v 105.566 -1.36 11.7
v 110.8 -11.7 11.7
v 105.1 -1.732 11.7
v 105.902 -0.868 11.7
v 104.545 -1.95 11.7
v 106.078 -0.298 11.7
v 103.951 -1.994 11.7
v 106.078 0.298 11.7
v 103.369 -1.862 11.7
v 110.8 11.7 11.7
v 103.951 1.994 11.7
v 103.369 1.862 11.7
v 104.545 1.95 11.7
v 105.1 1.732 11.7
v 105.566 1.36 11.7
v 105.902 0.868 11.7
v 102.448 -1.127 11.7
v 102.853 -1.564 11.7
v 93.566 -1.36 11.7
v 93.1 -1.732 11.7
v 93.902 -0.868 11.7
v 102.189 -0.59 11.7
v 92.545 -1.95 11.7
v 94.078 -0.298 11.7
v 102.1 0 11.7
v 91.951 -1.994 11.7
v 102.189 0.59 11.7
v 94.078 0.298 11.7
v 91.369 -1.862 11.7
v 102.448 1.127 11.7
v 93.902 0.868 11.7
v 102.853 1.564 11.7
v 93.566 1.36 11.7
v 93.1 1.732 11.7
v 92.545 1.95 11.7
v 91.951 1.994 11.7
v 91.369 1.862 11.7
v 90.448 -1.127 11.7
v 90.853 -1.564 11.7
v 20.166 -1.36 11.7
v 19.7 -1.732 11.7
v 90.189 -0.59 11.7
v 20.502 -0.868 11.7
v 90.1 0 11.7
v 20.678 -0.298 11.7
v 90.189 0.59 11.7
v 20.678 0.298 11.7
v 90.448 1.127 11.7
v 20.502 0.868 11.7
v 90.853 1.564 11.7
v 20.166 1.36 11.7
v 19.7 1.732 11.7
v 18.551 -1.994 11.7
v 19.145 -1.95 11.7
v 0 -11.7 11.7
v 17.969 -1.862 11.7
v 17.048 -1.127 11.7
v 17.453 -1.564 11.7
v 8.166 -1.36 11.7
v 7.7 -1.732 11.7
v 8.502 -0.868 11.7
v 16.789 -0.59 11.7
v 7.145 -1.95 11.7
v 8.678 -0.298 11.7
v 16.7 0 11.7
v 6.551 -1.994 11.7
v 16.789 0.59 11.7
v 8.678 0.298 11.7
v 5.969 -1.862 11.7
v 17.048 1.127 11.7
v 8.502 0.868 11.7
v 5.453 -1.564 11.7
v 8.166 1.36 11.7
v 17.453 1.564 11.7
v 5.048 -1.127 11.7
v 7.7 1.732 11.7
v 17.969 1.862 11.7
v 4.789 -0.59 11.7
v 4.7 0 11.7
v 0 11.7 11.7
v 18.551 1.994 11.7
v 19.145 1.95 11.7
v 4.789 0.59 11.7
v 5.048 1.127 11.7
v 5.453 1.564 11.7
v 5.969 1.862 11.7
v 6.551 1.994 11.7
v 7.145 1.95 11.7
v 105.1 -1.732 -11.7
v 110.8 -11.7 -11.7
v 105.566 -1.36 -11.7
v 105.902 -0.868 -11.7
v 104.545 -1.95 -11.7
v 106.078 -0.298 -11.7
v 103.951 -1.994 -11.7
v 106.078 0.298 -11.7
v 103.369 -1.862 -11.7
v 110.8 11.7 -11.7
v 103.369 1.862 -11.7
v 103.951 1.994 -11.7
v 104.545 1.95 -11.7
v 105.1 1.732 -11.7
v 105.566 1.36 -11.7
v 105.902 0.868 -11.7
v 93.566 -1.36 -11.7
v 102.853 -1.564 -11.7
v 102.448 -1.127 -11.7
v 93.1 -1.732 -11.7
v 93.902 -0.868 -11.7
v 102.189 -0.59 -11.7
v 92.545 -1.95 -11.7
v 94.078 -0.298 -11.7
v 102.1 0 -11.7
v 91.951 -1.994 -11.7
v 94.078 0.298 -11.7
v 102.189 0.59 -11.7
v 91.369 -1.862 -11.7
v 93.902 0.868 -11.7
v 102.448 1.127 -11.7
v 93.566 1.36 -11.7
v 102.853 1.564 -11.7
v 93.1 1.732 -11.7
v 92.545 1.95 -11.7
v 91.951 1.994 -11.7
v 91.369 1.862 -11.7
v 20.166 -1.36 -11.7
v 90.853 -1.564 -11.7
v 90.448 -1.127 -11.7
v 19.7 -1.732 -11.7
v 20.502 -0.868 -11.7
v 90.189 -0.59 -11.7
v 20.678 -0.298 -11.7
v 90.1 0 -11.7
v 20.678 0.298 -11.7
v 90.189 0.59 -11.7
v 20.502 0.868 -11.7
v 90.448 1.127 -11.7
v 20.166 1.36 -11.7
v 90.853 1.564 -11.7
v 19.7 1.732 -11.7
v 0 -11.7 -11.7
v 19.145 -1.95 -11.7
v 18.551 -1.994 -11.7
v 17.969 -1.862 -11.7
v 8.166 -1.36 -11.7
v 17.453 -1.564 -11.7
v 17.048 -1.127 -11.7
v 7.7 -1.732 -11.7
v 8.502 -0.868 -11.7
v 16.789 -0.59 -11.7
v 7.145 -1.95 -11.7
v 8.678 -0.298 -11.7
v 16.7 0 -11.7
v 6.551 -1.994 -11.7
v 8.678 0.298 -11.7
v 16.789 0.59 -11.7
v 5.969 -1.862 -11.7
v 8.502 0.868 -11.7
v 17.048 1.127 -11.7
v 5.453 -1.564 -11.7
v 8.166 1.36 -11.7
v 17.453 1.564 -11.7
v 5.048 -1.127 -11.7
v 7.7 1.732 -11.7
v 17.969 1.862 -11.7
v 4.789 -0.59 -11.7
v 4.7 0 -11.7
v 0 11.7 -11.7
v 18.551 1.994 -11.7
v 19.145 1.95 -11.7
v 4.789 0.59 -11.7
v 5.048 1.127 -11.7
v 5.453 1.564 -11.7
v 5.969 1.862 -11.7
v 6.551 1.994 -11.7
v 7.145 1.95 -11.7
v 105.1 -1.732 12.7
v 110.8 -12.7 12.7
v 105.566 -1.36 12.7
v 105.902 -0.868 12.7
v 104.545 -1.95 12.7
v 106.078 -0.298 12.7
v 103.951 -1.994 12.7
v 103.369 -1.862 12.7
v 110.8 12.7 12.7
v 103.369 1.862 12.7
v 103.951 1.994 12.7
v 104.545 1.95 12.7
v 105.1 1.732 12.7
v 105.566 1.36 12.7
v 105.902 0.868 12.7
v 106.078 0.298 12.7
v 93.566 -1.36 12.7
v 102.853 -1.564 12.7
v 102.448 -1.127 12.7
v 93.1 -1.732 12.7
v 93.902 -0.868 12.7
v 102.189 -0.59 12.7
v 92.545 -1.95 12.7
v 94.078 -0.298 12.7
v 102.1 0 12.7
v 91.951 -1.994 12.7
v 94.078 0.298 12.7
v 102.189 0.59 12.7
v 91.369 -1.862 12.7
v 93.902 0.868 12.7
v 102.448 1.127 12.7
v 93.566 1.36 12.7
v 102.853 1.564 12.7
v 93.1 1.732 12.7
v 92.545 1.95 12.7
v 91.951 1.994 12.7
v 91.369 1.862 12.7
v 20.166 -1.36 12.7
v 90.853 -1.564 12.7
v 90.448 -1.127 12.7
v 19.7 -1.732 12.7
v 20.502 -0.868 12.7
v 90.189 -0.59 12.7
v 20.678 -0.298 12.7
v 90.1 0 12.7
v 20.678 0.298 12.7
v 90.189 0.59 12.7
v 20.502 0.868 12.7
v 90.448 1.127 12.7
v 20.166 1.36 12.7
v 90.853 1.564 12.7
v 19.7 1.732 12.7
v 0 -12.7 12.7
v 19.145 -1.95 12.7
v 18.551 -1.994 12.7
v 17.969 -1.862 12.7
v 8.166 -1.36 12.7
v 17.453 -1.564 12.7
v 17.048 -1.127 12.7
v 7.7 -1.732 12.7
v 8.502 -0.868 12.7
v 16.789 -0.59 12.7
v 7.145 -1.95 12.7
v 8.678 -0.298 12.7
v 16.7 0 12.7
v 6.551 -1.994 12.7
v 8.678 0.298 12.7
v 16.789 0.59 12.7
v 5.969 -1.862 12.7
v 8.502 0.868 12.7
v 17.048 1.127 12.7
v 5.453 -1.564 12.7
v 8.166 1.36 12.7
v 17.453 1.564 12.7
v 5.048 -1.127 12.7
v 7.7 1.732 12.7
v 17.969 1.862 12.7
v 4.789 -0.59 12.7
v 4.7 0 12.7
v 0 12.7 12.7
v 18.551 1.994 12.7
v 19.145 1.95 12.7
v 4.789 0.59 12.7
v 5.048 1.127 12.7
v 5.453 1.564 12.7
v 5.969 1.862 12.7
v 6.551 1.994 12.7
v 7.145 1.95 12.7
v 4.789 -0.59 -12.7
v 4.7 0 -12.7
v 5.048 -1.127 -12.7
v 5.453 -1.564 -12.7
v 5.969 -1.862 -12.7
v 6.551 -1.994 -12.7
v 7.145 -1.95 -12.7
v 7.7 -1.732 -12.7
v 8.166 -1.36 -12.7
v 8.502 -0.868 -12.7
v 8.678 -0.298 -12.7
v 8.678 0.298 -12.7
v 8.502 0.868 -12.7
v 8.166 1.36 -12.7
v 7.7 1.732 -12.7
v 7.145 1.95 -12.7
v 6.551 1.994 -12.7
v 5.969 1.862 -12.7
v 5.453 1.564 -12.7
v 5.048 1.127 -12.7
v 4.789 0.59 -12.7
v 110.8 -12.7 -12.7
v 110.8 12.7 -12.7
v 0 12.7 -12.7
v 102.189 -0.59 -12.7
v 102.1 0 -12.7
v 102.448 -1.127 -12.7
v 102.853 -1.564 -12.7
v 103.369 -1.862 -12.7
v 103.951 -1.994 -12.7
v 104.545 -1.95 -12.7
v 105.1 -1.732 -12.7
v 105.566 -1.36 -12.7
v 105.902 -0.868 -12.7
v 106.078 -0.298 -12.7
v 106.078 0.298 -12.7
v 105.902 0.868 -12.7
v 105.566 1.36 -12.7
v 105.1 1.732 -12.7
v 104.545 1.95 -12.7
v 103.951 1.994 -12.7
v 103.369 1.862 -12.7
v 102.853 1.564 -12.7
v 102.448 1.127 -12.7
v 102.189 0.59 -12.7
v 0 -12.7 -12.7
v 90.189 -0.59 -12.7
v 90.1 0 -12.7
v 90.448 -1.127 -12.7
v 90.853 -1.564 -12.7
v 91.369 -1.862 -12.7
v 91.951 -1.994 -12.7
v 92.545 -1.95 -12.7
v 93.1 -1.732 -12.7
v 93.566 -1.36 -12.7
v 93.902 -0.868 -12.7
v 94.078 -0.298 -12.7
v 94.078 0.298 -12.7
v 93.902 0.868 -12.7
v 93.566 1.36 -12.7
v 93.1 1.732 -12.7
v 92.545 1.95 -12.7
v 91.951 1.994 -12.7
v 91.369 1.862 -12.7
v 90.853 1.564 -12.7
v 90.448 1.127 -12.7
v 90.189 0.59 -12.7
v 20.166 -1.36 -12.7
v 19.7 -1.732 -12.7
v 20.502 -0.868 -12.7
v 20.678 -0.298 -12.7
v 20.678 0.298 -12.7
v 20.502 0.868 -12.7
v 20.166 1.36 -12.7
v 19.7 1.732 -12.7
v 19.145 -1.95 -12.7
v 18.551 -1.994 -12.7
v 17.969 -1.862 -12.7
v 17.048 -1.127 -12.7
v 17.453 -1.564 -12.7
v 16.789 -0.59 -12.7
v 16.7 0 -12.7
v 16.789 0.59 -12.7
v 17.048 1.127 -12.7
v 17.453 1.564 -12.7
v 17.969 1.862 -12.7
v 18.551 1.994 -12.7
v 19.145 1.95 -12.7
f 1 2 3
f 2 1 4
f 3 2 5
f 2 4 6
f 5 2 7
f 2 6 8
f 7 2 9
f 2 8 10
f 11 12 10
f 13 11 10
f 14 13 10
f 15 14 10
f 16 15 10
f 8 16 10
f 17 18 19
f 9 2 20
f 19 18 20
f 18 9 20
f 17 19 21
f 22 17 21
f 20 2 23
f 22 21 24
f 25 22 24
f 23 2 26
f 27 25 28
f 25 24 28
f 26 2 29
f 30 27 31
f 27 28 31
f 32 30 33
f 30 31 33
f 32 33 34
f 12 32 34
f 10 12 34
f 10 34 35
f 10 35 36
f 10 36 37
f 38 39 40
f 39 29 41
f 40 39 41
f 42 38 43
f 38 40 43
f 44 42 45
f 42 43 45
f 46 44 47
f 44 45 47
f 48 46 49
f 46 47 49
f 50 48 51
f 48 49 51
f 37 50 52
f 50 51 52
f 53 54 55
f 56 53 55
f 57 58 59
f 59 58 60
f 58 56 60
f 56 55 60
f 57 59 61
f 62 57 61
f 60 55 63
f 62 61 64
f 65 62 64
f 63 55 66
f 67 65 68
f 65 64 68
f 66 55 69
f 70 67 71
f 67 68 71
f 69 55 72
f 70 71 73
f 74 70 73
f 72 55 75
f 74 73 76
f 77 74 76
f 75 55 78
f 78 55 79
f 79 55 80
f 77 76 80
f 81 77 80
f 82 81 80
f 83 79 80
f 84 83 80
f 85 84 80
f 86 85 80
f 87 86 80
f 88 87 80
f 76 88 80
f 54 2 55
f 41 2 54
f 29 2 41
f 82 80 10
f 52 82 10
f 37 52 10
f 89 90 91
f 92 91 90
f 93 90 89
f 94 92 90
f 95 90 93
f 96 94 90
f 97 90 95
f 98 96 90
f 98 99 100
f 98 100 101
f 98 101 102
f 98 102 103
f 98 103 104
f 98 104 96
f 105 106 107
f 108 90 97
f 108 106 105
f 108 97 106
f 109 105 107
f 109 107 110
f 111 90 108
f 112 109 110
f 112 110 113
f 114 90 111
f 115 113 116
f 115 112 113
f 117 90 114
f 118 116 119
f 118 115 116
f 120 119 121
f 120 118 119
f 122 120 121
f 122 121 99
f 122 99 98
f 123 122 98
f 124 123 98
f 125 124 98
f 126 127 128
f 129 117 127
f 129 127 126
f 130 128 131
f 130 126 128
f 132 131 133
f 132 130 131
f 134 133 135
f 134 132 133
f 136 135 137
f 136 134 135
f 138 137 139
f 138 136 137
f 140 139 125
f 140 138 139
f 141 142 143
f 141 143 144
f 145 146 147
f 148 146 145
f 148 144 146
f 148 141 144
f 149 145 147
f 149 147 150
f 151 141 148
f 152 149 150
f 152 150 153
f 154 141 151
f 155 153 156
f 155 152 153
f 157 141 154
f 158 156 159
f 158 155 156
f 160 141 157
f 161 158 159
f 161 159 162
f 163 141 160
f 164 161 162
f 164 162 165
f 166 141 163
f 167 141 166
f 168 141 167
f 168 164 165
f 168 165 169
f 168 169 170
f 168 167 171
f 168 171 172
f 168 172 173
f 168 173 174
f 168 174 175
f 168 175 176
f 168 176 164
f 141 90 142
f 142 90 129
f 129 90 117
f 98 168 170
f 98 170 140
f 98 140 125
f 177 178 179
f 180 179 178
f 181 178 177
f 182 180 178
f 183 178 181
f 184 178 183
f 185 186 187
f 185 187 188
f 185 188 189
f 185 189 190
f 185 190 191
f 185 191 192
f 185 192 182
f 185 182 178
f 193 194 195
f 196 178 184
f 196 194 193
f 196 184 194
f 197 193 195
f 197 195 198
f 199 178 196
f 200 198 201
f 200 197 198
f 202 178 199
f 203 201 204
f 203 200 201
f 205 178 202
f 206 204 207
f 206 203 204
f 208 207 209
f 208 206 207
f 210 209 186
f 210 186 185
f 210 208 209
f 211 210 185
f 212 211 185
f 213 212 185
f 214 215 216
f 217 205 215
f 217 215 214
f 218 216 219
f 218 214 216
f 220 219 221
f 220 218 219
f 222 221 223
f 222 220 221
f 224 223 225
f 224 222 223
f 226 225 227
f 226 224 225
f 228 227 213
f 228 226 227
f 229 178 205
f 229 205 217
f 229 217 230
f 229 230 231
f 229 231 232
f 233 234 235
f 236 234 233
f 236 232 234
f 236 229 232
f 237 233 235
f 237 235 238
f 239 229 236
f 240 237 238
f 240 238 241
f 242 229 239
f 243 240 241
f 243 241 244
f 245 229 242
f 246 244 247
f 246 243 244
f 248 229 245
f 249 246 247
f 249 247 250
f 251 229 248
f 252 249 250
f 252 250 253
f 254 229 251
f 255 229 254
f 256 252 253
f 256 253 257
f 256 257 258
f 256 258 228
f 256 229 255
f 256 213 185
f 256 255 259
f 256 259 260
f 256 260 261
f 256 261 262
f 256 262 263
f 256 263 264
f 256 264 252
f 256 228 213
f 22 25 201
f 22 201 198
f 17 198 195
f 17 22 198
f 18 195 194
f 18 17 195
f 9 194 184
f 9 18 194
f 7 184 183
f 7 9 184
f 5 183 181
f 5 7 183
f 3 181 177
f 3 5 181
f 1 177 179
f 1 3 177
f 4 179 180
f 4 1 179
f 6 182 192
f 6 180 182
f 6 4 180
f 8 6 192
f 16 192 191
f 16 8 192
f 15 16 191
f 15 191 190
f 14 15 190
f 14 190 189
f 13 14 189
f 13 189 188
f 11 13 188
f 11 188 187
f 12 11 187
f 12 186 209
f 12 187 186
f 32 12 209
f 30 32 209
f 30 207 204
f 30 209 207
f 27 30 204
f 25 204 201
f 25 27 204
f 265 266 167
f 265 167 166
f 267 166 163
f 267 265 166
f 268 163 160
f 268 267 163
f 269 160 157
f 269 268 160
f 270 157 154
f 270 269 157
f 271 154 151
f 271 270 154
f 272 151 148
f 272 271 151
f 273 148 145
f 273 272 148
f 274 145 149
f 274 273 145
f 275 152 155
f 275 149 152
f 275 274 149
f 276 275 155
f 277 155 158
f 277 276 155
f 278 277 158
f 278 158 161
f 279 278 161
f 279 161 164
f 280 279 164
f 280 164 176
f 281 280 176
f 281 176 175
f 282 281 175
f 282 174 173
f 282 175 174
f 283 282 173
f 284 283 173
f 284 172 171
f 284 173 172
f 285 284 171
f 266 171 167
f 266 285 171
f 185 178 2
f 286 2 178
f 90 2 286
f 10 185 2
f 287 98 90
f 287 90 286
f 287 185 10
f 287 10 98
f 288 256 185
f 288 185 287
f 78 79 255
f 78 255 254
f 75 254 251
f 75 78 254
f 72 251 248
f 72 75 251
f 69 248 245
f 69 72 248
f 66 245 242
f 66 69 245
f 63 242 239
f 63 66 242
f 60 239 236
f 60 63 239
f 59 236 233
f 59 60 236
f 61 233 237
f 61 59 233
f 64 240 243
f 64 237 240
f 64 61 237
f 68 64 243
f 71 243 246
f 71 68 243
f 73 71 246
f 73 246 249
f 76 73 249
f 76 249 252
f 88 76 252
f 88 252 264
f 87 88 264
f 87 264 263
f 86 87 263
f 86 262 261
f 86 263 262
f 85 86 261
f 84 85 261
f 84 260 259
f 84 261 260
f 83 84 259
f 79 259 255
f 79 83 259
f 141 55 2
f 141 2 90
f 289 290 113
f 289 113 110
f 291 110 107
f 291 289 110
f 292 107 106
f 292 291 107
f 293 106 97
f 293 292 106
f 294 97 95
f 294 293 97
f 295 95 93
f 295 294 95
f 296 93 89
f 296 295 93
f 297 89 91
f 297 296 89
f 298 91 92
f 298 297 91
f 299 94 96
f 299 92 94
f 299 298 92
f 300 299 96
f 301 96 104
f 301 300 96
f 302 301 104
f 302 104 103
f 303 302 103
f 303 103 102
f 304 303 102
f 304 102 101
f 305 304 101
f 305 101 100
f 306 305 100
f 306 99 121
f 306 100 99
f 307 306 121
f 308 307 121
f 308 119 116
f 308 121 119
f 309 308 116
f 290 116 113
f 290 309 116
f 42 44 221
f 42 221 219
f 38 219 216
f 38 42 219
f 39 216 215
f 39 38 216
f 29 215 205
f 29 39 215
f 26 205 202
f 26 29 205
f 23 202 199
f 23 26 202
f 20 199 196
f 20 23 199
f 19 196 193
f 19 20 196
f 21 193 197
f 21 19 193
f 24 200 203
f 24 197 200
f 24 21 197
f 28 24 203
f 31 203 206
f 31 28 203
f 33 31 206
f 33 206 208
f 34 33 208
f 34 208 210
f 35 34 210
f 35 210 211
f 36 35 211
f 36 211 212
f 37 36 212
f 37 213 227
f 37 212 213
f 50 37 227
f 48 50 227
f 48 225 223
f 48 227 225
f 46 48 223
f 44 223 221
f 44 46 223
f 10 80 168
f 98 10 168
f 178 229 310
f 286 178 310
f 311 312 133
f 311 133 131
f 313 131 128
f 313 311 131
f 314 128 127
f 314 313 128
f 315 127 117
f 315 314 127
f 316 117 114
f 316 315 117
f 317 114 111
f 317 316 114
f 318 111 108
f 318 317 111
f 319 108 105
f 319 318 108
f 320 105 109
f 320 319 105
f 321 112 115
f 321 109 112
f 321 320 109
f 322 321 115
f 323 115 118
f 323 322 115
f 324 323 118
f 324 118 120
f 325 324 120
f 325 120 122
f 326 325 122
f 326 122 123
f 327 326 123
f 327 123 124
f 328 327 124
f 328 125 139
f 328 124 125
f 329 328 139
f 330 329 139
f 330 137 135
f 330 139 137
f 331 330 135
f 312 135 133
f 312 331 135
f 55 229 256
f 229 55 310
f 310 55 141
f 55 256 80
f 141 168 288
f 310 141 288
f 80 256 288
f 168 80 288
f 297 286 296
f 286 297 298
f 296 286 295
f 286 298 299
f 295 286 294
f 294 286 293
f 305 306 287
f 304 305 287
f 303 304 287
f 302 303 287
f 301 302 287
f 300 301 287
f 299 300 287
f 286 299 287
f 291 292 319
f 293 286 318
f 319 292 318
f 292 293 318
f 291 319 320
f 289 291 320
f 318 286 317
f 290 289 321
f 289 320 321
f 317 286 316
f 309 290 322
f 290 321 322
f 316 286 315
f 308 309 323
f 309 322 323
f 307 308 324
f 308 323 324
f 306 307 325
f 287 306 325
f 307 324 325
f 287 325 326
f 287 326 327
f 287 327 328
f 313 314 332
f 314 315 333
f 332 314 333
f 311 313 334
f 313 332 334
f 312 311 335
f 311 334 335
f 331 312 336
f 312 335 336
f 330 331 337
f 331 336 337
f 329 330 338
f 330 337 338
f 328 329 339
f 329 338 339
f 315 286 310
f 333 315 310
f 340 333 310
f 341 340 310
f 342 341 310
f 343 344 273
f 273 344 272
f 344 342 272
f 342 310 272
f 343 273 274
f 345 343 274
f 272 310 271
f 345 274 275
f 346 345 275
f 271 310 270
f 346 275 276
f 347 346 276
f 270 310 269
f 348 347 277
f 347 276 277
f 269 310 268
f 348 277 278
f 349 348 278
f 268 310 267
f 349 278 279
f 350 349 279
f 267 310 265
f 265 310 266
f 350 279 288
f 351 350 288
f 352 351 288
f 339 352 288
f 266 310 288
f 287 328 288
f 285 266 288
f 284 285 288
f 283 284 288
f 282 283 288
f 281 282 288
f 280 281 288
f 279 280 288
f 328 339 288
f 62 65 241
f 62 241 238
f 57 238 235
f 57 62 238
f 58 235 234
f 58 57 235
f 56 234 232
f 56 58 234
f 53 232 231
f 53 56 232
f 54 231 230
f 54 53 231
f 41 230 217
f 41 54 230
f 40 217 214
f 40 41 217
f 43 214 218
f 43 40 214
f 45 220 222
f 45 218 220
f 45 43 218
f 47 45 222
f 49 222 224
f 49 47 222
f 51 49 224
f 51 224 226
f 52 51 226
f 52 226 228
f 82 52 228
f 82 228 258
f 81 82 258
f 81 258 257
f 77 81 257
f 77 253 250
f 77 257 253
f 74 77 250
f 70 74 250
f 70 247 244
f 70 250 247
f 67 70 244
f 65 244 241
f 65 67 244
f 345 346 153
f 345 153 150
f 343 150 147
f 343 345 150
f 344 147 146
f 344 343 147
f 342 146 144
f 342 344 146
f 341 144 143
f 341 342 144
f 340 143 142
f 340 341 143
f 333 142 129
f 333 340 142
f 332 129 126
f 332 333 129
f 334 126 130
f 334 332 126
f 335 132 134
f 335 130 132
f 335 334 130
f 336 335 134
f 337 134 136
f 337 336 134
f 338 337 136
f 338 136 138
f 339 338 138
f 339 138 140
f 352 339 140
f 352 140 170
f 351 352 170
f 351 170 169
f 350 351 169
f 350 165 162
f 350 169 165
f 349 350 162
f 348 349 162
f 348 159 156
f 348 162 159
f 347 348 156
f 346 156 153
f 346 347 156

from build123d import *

# Parameters (mm, degrees)
SKETCH1_W               = 25.4
SKETCH1_H               = 25.4
SKETCH1_W_2             = 23.4
SKETCH1_H_2             = 23.4
BOSS_EXTRUDE1_DEPTH     = 110.8
CUT_EXTRUDE1_DEPTH      = 115.38133589
CUT_EXTRUDE1_DEPTH_BACK = 115.38133589
SKETCH2_R               = 2


with BuildPart() as part:
    # Sketch1 → Boss-Extrude1 (new body)
    with BuildSketch(Plane(origin=(0, 0, 0), x_dir=(0, 0, -1), z_dir=(1, 0, 0))):
        Rectangle(SKETCH1_W, SKETCH1_H)
        Rectangle(SKETCH1_W_2, SKETCH1_H_2, mode=Mode.SUBTRACT)
    extrude(amount=BOSS_EXTRUDE1_DEPTH)

    # Sketch2 → Cut-Extrude1 (cut, two sides: drawn at the far end of the back side and taken through both)
    with BuildSketch(Plane.XY.offset(12.7).offset(-CUT_EXTRUDE1_DEPTH_BACK)):
        with Locations(Location((92.1, 0, 0), (0, 0, 180))):
            Circle(SKETCH2_R)
        with Locations(Location((104.1, 0, 0), (0, 0, 180))):
            Circle(SKETCH2_R)
        with Locations(Location((6.7, 0, 0), (0, 0, 180))):
            Circle(SKETCH2_R)
        with Locations(Location((18.7, 0, 0), (0, 0, 180))):
            Circle(SKETCH2_R)
    extrude(amount=CUT_EXTRUDE1_DEPTH + CUT_EXTRUDE1_DEPTH_BACK, mode=Mode.SUBTRACT)


solid = part.part
